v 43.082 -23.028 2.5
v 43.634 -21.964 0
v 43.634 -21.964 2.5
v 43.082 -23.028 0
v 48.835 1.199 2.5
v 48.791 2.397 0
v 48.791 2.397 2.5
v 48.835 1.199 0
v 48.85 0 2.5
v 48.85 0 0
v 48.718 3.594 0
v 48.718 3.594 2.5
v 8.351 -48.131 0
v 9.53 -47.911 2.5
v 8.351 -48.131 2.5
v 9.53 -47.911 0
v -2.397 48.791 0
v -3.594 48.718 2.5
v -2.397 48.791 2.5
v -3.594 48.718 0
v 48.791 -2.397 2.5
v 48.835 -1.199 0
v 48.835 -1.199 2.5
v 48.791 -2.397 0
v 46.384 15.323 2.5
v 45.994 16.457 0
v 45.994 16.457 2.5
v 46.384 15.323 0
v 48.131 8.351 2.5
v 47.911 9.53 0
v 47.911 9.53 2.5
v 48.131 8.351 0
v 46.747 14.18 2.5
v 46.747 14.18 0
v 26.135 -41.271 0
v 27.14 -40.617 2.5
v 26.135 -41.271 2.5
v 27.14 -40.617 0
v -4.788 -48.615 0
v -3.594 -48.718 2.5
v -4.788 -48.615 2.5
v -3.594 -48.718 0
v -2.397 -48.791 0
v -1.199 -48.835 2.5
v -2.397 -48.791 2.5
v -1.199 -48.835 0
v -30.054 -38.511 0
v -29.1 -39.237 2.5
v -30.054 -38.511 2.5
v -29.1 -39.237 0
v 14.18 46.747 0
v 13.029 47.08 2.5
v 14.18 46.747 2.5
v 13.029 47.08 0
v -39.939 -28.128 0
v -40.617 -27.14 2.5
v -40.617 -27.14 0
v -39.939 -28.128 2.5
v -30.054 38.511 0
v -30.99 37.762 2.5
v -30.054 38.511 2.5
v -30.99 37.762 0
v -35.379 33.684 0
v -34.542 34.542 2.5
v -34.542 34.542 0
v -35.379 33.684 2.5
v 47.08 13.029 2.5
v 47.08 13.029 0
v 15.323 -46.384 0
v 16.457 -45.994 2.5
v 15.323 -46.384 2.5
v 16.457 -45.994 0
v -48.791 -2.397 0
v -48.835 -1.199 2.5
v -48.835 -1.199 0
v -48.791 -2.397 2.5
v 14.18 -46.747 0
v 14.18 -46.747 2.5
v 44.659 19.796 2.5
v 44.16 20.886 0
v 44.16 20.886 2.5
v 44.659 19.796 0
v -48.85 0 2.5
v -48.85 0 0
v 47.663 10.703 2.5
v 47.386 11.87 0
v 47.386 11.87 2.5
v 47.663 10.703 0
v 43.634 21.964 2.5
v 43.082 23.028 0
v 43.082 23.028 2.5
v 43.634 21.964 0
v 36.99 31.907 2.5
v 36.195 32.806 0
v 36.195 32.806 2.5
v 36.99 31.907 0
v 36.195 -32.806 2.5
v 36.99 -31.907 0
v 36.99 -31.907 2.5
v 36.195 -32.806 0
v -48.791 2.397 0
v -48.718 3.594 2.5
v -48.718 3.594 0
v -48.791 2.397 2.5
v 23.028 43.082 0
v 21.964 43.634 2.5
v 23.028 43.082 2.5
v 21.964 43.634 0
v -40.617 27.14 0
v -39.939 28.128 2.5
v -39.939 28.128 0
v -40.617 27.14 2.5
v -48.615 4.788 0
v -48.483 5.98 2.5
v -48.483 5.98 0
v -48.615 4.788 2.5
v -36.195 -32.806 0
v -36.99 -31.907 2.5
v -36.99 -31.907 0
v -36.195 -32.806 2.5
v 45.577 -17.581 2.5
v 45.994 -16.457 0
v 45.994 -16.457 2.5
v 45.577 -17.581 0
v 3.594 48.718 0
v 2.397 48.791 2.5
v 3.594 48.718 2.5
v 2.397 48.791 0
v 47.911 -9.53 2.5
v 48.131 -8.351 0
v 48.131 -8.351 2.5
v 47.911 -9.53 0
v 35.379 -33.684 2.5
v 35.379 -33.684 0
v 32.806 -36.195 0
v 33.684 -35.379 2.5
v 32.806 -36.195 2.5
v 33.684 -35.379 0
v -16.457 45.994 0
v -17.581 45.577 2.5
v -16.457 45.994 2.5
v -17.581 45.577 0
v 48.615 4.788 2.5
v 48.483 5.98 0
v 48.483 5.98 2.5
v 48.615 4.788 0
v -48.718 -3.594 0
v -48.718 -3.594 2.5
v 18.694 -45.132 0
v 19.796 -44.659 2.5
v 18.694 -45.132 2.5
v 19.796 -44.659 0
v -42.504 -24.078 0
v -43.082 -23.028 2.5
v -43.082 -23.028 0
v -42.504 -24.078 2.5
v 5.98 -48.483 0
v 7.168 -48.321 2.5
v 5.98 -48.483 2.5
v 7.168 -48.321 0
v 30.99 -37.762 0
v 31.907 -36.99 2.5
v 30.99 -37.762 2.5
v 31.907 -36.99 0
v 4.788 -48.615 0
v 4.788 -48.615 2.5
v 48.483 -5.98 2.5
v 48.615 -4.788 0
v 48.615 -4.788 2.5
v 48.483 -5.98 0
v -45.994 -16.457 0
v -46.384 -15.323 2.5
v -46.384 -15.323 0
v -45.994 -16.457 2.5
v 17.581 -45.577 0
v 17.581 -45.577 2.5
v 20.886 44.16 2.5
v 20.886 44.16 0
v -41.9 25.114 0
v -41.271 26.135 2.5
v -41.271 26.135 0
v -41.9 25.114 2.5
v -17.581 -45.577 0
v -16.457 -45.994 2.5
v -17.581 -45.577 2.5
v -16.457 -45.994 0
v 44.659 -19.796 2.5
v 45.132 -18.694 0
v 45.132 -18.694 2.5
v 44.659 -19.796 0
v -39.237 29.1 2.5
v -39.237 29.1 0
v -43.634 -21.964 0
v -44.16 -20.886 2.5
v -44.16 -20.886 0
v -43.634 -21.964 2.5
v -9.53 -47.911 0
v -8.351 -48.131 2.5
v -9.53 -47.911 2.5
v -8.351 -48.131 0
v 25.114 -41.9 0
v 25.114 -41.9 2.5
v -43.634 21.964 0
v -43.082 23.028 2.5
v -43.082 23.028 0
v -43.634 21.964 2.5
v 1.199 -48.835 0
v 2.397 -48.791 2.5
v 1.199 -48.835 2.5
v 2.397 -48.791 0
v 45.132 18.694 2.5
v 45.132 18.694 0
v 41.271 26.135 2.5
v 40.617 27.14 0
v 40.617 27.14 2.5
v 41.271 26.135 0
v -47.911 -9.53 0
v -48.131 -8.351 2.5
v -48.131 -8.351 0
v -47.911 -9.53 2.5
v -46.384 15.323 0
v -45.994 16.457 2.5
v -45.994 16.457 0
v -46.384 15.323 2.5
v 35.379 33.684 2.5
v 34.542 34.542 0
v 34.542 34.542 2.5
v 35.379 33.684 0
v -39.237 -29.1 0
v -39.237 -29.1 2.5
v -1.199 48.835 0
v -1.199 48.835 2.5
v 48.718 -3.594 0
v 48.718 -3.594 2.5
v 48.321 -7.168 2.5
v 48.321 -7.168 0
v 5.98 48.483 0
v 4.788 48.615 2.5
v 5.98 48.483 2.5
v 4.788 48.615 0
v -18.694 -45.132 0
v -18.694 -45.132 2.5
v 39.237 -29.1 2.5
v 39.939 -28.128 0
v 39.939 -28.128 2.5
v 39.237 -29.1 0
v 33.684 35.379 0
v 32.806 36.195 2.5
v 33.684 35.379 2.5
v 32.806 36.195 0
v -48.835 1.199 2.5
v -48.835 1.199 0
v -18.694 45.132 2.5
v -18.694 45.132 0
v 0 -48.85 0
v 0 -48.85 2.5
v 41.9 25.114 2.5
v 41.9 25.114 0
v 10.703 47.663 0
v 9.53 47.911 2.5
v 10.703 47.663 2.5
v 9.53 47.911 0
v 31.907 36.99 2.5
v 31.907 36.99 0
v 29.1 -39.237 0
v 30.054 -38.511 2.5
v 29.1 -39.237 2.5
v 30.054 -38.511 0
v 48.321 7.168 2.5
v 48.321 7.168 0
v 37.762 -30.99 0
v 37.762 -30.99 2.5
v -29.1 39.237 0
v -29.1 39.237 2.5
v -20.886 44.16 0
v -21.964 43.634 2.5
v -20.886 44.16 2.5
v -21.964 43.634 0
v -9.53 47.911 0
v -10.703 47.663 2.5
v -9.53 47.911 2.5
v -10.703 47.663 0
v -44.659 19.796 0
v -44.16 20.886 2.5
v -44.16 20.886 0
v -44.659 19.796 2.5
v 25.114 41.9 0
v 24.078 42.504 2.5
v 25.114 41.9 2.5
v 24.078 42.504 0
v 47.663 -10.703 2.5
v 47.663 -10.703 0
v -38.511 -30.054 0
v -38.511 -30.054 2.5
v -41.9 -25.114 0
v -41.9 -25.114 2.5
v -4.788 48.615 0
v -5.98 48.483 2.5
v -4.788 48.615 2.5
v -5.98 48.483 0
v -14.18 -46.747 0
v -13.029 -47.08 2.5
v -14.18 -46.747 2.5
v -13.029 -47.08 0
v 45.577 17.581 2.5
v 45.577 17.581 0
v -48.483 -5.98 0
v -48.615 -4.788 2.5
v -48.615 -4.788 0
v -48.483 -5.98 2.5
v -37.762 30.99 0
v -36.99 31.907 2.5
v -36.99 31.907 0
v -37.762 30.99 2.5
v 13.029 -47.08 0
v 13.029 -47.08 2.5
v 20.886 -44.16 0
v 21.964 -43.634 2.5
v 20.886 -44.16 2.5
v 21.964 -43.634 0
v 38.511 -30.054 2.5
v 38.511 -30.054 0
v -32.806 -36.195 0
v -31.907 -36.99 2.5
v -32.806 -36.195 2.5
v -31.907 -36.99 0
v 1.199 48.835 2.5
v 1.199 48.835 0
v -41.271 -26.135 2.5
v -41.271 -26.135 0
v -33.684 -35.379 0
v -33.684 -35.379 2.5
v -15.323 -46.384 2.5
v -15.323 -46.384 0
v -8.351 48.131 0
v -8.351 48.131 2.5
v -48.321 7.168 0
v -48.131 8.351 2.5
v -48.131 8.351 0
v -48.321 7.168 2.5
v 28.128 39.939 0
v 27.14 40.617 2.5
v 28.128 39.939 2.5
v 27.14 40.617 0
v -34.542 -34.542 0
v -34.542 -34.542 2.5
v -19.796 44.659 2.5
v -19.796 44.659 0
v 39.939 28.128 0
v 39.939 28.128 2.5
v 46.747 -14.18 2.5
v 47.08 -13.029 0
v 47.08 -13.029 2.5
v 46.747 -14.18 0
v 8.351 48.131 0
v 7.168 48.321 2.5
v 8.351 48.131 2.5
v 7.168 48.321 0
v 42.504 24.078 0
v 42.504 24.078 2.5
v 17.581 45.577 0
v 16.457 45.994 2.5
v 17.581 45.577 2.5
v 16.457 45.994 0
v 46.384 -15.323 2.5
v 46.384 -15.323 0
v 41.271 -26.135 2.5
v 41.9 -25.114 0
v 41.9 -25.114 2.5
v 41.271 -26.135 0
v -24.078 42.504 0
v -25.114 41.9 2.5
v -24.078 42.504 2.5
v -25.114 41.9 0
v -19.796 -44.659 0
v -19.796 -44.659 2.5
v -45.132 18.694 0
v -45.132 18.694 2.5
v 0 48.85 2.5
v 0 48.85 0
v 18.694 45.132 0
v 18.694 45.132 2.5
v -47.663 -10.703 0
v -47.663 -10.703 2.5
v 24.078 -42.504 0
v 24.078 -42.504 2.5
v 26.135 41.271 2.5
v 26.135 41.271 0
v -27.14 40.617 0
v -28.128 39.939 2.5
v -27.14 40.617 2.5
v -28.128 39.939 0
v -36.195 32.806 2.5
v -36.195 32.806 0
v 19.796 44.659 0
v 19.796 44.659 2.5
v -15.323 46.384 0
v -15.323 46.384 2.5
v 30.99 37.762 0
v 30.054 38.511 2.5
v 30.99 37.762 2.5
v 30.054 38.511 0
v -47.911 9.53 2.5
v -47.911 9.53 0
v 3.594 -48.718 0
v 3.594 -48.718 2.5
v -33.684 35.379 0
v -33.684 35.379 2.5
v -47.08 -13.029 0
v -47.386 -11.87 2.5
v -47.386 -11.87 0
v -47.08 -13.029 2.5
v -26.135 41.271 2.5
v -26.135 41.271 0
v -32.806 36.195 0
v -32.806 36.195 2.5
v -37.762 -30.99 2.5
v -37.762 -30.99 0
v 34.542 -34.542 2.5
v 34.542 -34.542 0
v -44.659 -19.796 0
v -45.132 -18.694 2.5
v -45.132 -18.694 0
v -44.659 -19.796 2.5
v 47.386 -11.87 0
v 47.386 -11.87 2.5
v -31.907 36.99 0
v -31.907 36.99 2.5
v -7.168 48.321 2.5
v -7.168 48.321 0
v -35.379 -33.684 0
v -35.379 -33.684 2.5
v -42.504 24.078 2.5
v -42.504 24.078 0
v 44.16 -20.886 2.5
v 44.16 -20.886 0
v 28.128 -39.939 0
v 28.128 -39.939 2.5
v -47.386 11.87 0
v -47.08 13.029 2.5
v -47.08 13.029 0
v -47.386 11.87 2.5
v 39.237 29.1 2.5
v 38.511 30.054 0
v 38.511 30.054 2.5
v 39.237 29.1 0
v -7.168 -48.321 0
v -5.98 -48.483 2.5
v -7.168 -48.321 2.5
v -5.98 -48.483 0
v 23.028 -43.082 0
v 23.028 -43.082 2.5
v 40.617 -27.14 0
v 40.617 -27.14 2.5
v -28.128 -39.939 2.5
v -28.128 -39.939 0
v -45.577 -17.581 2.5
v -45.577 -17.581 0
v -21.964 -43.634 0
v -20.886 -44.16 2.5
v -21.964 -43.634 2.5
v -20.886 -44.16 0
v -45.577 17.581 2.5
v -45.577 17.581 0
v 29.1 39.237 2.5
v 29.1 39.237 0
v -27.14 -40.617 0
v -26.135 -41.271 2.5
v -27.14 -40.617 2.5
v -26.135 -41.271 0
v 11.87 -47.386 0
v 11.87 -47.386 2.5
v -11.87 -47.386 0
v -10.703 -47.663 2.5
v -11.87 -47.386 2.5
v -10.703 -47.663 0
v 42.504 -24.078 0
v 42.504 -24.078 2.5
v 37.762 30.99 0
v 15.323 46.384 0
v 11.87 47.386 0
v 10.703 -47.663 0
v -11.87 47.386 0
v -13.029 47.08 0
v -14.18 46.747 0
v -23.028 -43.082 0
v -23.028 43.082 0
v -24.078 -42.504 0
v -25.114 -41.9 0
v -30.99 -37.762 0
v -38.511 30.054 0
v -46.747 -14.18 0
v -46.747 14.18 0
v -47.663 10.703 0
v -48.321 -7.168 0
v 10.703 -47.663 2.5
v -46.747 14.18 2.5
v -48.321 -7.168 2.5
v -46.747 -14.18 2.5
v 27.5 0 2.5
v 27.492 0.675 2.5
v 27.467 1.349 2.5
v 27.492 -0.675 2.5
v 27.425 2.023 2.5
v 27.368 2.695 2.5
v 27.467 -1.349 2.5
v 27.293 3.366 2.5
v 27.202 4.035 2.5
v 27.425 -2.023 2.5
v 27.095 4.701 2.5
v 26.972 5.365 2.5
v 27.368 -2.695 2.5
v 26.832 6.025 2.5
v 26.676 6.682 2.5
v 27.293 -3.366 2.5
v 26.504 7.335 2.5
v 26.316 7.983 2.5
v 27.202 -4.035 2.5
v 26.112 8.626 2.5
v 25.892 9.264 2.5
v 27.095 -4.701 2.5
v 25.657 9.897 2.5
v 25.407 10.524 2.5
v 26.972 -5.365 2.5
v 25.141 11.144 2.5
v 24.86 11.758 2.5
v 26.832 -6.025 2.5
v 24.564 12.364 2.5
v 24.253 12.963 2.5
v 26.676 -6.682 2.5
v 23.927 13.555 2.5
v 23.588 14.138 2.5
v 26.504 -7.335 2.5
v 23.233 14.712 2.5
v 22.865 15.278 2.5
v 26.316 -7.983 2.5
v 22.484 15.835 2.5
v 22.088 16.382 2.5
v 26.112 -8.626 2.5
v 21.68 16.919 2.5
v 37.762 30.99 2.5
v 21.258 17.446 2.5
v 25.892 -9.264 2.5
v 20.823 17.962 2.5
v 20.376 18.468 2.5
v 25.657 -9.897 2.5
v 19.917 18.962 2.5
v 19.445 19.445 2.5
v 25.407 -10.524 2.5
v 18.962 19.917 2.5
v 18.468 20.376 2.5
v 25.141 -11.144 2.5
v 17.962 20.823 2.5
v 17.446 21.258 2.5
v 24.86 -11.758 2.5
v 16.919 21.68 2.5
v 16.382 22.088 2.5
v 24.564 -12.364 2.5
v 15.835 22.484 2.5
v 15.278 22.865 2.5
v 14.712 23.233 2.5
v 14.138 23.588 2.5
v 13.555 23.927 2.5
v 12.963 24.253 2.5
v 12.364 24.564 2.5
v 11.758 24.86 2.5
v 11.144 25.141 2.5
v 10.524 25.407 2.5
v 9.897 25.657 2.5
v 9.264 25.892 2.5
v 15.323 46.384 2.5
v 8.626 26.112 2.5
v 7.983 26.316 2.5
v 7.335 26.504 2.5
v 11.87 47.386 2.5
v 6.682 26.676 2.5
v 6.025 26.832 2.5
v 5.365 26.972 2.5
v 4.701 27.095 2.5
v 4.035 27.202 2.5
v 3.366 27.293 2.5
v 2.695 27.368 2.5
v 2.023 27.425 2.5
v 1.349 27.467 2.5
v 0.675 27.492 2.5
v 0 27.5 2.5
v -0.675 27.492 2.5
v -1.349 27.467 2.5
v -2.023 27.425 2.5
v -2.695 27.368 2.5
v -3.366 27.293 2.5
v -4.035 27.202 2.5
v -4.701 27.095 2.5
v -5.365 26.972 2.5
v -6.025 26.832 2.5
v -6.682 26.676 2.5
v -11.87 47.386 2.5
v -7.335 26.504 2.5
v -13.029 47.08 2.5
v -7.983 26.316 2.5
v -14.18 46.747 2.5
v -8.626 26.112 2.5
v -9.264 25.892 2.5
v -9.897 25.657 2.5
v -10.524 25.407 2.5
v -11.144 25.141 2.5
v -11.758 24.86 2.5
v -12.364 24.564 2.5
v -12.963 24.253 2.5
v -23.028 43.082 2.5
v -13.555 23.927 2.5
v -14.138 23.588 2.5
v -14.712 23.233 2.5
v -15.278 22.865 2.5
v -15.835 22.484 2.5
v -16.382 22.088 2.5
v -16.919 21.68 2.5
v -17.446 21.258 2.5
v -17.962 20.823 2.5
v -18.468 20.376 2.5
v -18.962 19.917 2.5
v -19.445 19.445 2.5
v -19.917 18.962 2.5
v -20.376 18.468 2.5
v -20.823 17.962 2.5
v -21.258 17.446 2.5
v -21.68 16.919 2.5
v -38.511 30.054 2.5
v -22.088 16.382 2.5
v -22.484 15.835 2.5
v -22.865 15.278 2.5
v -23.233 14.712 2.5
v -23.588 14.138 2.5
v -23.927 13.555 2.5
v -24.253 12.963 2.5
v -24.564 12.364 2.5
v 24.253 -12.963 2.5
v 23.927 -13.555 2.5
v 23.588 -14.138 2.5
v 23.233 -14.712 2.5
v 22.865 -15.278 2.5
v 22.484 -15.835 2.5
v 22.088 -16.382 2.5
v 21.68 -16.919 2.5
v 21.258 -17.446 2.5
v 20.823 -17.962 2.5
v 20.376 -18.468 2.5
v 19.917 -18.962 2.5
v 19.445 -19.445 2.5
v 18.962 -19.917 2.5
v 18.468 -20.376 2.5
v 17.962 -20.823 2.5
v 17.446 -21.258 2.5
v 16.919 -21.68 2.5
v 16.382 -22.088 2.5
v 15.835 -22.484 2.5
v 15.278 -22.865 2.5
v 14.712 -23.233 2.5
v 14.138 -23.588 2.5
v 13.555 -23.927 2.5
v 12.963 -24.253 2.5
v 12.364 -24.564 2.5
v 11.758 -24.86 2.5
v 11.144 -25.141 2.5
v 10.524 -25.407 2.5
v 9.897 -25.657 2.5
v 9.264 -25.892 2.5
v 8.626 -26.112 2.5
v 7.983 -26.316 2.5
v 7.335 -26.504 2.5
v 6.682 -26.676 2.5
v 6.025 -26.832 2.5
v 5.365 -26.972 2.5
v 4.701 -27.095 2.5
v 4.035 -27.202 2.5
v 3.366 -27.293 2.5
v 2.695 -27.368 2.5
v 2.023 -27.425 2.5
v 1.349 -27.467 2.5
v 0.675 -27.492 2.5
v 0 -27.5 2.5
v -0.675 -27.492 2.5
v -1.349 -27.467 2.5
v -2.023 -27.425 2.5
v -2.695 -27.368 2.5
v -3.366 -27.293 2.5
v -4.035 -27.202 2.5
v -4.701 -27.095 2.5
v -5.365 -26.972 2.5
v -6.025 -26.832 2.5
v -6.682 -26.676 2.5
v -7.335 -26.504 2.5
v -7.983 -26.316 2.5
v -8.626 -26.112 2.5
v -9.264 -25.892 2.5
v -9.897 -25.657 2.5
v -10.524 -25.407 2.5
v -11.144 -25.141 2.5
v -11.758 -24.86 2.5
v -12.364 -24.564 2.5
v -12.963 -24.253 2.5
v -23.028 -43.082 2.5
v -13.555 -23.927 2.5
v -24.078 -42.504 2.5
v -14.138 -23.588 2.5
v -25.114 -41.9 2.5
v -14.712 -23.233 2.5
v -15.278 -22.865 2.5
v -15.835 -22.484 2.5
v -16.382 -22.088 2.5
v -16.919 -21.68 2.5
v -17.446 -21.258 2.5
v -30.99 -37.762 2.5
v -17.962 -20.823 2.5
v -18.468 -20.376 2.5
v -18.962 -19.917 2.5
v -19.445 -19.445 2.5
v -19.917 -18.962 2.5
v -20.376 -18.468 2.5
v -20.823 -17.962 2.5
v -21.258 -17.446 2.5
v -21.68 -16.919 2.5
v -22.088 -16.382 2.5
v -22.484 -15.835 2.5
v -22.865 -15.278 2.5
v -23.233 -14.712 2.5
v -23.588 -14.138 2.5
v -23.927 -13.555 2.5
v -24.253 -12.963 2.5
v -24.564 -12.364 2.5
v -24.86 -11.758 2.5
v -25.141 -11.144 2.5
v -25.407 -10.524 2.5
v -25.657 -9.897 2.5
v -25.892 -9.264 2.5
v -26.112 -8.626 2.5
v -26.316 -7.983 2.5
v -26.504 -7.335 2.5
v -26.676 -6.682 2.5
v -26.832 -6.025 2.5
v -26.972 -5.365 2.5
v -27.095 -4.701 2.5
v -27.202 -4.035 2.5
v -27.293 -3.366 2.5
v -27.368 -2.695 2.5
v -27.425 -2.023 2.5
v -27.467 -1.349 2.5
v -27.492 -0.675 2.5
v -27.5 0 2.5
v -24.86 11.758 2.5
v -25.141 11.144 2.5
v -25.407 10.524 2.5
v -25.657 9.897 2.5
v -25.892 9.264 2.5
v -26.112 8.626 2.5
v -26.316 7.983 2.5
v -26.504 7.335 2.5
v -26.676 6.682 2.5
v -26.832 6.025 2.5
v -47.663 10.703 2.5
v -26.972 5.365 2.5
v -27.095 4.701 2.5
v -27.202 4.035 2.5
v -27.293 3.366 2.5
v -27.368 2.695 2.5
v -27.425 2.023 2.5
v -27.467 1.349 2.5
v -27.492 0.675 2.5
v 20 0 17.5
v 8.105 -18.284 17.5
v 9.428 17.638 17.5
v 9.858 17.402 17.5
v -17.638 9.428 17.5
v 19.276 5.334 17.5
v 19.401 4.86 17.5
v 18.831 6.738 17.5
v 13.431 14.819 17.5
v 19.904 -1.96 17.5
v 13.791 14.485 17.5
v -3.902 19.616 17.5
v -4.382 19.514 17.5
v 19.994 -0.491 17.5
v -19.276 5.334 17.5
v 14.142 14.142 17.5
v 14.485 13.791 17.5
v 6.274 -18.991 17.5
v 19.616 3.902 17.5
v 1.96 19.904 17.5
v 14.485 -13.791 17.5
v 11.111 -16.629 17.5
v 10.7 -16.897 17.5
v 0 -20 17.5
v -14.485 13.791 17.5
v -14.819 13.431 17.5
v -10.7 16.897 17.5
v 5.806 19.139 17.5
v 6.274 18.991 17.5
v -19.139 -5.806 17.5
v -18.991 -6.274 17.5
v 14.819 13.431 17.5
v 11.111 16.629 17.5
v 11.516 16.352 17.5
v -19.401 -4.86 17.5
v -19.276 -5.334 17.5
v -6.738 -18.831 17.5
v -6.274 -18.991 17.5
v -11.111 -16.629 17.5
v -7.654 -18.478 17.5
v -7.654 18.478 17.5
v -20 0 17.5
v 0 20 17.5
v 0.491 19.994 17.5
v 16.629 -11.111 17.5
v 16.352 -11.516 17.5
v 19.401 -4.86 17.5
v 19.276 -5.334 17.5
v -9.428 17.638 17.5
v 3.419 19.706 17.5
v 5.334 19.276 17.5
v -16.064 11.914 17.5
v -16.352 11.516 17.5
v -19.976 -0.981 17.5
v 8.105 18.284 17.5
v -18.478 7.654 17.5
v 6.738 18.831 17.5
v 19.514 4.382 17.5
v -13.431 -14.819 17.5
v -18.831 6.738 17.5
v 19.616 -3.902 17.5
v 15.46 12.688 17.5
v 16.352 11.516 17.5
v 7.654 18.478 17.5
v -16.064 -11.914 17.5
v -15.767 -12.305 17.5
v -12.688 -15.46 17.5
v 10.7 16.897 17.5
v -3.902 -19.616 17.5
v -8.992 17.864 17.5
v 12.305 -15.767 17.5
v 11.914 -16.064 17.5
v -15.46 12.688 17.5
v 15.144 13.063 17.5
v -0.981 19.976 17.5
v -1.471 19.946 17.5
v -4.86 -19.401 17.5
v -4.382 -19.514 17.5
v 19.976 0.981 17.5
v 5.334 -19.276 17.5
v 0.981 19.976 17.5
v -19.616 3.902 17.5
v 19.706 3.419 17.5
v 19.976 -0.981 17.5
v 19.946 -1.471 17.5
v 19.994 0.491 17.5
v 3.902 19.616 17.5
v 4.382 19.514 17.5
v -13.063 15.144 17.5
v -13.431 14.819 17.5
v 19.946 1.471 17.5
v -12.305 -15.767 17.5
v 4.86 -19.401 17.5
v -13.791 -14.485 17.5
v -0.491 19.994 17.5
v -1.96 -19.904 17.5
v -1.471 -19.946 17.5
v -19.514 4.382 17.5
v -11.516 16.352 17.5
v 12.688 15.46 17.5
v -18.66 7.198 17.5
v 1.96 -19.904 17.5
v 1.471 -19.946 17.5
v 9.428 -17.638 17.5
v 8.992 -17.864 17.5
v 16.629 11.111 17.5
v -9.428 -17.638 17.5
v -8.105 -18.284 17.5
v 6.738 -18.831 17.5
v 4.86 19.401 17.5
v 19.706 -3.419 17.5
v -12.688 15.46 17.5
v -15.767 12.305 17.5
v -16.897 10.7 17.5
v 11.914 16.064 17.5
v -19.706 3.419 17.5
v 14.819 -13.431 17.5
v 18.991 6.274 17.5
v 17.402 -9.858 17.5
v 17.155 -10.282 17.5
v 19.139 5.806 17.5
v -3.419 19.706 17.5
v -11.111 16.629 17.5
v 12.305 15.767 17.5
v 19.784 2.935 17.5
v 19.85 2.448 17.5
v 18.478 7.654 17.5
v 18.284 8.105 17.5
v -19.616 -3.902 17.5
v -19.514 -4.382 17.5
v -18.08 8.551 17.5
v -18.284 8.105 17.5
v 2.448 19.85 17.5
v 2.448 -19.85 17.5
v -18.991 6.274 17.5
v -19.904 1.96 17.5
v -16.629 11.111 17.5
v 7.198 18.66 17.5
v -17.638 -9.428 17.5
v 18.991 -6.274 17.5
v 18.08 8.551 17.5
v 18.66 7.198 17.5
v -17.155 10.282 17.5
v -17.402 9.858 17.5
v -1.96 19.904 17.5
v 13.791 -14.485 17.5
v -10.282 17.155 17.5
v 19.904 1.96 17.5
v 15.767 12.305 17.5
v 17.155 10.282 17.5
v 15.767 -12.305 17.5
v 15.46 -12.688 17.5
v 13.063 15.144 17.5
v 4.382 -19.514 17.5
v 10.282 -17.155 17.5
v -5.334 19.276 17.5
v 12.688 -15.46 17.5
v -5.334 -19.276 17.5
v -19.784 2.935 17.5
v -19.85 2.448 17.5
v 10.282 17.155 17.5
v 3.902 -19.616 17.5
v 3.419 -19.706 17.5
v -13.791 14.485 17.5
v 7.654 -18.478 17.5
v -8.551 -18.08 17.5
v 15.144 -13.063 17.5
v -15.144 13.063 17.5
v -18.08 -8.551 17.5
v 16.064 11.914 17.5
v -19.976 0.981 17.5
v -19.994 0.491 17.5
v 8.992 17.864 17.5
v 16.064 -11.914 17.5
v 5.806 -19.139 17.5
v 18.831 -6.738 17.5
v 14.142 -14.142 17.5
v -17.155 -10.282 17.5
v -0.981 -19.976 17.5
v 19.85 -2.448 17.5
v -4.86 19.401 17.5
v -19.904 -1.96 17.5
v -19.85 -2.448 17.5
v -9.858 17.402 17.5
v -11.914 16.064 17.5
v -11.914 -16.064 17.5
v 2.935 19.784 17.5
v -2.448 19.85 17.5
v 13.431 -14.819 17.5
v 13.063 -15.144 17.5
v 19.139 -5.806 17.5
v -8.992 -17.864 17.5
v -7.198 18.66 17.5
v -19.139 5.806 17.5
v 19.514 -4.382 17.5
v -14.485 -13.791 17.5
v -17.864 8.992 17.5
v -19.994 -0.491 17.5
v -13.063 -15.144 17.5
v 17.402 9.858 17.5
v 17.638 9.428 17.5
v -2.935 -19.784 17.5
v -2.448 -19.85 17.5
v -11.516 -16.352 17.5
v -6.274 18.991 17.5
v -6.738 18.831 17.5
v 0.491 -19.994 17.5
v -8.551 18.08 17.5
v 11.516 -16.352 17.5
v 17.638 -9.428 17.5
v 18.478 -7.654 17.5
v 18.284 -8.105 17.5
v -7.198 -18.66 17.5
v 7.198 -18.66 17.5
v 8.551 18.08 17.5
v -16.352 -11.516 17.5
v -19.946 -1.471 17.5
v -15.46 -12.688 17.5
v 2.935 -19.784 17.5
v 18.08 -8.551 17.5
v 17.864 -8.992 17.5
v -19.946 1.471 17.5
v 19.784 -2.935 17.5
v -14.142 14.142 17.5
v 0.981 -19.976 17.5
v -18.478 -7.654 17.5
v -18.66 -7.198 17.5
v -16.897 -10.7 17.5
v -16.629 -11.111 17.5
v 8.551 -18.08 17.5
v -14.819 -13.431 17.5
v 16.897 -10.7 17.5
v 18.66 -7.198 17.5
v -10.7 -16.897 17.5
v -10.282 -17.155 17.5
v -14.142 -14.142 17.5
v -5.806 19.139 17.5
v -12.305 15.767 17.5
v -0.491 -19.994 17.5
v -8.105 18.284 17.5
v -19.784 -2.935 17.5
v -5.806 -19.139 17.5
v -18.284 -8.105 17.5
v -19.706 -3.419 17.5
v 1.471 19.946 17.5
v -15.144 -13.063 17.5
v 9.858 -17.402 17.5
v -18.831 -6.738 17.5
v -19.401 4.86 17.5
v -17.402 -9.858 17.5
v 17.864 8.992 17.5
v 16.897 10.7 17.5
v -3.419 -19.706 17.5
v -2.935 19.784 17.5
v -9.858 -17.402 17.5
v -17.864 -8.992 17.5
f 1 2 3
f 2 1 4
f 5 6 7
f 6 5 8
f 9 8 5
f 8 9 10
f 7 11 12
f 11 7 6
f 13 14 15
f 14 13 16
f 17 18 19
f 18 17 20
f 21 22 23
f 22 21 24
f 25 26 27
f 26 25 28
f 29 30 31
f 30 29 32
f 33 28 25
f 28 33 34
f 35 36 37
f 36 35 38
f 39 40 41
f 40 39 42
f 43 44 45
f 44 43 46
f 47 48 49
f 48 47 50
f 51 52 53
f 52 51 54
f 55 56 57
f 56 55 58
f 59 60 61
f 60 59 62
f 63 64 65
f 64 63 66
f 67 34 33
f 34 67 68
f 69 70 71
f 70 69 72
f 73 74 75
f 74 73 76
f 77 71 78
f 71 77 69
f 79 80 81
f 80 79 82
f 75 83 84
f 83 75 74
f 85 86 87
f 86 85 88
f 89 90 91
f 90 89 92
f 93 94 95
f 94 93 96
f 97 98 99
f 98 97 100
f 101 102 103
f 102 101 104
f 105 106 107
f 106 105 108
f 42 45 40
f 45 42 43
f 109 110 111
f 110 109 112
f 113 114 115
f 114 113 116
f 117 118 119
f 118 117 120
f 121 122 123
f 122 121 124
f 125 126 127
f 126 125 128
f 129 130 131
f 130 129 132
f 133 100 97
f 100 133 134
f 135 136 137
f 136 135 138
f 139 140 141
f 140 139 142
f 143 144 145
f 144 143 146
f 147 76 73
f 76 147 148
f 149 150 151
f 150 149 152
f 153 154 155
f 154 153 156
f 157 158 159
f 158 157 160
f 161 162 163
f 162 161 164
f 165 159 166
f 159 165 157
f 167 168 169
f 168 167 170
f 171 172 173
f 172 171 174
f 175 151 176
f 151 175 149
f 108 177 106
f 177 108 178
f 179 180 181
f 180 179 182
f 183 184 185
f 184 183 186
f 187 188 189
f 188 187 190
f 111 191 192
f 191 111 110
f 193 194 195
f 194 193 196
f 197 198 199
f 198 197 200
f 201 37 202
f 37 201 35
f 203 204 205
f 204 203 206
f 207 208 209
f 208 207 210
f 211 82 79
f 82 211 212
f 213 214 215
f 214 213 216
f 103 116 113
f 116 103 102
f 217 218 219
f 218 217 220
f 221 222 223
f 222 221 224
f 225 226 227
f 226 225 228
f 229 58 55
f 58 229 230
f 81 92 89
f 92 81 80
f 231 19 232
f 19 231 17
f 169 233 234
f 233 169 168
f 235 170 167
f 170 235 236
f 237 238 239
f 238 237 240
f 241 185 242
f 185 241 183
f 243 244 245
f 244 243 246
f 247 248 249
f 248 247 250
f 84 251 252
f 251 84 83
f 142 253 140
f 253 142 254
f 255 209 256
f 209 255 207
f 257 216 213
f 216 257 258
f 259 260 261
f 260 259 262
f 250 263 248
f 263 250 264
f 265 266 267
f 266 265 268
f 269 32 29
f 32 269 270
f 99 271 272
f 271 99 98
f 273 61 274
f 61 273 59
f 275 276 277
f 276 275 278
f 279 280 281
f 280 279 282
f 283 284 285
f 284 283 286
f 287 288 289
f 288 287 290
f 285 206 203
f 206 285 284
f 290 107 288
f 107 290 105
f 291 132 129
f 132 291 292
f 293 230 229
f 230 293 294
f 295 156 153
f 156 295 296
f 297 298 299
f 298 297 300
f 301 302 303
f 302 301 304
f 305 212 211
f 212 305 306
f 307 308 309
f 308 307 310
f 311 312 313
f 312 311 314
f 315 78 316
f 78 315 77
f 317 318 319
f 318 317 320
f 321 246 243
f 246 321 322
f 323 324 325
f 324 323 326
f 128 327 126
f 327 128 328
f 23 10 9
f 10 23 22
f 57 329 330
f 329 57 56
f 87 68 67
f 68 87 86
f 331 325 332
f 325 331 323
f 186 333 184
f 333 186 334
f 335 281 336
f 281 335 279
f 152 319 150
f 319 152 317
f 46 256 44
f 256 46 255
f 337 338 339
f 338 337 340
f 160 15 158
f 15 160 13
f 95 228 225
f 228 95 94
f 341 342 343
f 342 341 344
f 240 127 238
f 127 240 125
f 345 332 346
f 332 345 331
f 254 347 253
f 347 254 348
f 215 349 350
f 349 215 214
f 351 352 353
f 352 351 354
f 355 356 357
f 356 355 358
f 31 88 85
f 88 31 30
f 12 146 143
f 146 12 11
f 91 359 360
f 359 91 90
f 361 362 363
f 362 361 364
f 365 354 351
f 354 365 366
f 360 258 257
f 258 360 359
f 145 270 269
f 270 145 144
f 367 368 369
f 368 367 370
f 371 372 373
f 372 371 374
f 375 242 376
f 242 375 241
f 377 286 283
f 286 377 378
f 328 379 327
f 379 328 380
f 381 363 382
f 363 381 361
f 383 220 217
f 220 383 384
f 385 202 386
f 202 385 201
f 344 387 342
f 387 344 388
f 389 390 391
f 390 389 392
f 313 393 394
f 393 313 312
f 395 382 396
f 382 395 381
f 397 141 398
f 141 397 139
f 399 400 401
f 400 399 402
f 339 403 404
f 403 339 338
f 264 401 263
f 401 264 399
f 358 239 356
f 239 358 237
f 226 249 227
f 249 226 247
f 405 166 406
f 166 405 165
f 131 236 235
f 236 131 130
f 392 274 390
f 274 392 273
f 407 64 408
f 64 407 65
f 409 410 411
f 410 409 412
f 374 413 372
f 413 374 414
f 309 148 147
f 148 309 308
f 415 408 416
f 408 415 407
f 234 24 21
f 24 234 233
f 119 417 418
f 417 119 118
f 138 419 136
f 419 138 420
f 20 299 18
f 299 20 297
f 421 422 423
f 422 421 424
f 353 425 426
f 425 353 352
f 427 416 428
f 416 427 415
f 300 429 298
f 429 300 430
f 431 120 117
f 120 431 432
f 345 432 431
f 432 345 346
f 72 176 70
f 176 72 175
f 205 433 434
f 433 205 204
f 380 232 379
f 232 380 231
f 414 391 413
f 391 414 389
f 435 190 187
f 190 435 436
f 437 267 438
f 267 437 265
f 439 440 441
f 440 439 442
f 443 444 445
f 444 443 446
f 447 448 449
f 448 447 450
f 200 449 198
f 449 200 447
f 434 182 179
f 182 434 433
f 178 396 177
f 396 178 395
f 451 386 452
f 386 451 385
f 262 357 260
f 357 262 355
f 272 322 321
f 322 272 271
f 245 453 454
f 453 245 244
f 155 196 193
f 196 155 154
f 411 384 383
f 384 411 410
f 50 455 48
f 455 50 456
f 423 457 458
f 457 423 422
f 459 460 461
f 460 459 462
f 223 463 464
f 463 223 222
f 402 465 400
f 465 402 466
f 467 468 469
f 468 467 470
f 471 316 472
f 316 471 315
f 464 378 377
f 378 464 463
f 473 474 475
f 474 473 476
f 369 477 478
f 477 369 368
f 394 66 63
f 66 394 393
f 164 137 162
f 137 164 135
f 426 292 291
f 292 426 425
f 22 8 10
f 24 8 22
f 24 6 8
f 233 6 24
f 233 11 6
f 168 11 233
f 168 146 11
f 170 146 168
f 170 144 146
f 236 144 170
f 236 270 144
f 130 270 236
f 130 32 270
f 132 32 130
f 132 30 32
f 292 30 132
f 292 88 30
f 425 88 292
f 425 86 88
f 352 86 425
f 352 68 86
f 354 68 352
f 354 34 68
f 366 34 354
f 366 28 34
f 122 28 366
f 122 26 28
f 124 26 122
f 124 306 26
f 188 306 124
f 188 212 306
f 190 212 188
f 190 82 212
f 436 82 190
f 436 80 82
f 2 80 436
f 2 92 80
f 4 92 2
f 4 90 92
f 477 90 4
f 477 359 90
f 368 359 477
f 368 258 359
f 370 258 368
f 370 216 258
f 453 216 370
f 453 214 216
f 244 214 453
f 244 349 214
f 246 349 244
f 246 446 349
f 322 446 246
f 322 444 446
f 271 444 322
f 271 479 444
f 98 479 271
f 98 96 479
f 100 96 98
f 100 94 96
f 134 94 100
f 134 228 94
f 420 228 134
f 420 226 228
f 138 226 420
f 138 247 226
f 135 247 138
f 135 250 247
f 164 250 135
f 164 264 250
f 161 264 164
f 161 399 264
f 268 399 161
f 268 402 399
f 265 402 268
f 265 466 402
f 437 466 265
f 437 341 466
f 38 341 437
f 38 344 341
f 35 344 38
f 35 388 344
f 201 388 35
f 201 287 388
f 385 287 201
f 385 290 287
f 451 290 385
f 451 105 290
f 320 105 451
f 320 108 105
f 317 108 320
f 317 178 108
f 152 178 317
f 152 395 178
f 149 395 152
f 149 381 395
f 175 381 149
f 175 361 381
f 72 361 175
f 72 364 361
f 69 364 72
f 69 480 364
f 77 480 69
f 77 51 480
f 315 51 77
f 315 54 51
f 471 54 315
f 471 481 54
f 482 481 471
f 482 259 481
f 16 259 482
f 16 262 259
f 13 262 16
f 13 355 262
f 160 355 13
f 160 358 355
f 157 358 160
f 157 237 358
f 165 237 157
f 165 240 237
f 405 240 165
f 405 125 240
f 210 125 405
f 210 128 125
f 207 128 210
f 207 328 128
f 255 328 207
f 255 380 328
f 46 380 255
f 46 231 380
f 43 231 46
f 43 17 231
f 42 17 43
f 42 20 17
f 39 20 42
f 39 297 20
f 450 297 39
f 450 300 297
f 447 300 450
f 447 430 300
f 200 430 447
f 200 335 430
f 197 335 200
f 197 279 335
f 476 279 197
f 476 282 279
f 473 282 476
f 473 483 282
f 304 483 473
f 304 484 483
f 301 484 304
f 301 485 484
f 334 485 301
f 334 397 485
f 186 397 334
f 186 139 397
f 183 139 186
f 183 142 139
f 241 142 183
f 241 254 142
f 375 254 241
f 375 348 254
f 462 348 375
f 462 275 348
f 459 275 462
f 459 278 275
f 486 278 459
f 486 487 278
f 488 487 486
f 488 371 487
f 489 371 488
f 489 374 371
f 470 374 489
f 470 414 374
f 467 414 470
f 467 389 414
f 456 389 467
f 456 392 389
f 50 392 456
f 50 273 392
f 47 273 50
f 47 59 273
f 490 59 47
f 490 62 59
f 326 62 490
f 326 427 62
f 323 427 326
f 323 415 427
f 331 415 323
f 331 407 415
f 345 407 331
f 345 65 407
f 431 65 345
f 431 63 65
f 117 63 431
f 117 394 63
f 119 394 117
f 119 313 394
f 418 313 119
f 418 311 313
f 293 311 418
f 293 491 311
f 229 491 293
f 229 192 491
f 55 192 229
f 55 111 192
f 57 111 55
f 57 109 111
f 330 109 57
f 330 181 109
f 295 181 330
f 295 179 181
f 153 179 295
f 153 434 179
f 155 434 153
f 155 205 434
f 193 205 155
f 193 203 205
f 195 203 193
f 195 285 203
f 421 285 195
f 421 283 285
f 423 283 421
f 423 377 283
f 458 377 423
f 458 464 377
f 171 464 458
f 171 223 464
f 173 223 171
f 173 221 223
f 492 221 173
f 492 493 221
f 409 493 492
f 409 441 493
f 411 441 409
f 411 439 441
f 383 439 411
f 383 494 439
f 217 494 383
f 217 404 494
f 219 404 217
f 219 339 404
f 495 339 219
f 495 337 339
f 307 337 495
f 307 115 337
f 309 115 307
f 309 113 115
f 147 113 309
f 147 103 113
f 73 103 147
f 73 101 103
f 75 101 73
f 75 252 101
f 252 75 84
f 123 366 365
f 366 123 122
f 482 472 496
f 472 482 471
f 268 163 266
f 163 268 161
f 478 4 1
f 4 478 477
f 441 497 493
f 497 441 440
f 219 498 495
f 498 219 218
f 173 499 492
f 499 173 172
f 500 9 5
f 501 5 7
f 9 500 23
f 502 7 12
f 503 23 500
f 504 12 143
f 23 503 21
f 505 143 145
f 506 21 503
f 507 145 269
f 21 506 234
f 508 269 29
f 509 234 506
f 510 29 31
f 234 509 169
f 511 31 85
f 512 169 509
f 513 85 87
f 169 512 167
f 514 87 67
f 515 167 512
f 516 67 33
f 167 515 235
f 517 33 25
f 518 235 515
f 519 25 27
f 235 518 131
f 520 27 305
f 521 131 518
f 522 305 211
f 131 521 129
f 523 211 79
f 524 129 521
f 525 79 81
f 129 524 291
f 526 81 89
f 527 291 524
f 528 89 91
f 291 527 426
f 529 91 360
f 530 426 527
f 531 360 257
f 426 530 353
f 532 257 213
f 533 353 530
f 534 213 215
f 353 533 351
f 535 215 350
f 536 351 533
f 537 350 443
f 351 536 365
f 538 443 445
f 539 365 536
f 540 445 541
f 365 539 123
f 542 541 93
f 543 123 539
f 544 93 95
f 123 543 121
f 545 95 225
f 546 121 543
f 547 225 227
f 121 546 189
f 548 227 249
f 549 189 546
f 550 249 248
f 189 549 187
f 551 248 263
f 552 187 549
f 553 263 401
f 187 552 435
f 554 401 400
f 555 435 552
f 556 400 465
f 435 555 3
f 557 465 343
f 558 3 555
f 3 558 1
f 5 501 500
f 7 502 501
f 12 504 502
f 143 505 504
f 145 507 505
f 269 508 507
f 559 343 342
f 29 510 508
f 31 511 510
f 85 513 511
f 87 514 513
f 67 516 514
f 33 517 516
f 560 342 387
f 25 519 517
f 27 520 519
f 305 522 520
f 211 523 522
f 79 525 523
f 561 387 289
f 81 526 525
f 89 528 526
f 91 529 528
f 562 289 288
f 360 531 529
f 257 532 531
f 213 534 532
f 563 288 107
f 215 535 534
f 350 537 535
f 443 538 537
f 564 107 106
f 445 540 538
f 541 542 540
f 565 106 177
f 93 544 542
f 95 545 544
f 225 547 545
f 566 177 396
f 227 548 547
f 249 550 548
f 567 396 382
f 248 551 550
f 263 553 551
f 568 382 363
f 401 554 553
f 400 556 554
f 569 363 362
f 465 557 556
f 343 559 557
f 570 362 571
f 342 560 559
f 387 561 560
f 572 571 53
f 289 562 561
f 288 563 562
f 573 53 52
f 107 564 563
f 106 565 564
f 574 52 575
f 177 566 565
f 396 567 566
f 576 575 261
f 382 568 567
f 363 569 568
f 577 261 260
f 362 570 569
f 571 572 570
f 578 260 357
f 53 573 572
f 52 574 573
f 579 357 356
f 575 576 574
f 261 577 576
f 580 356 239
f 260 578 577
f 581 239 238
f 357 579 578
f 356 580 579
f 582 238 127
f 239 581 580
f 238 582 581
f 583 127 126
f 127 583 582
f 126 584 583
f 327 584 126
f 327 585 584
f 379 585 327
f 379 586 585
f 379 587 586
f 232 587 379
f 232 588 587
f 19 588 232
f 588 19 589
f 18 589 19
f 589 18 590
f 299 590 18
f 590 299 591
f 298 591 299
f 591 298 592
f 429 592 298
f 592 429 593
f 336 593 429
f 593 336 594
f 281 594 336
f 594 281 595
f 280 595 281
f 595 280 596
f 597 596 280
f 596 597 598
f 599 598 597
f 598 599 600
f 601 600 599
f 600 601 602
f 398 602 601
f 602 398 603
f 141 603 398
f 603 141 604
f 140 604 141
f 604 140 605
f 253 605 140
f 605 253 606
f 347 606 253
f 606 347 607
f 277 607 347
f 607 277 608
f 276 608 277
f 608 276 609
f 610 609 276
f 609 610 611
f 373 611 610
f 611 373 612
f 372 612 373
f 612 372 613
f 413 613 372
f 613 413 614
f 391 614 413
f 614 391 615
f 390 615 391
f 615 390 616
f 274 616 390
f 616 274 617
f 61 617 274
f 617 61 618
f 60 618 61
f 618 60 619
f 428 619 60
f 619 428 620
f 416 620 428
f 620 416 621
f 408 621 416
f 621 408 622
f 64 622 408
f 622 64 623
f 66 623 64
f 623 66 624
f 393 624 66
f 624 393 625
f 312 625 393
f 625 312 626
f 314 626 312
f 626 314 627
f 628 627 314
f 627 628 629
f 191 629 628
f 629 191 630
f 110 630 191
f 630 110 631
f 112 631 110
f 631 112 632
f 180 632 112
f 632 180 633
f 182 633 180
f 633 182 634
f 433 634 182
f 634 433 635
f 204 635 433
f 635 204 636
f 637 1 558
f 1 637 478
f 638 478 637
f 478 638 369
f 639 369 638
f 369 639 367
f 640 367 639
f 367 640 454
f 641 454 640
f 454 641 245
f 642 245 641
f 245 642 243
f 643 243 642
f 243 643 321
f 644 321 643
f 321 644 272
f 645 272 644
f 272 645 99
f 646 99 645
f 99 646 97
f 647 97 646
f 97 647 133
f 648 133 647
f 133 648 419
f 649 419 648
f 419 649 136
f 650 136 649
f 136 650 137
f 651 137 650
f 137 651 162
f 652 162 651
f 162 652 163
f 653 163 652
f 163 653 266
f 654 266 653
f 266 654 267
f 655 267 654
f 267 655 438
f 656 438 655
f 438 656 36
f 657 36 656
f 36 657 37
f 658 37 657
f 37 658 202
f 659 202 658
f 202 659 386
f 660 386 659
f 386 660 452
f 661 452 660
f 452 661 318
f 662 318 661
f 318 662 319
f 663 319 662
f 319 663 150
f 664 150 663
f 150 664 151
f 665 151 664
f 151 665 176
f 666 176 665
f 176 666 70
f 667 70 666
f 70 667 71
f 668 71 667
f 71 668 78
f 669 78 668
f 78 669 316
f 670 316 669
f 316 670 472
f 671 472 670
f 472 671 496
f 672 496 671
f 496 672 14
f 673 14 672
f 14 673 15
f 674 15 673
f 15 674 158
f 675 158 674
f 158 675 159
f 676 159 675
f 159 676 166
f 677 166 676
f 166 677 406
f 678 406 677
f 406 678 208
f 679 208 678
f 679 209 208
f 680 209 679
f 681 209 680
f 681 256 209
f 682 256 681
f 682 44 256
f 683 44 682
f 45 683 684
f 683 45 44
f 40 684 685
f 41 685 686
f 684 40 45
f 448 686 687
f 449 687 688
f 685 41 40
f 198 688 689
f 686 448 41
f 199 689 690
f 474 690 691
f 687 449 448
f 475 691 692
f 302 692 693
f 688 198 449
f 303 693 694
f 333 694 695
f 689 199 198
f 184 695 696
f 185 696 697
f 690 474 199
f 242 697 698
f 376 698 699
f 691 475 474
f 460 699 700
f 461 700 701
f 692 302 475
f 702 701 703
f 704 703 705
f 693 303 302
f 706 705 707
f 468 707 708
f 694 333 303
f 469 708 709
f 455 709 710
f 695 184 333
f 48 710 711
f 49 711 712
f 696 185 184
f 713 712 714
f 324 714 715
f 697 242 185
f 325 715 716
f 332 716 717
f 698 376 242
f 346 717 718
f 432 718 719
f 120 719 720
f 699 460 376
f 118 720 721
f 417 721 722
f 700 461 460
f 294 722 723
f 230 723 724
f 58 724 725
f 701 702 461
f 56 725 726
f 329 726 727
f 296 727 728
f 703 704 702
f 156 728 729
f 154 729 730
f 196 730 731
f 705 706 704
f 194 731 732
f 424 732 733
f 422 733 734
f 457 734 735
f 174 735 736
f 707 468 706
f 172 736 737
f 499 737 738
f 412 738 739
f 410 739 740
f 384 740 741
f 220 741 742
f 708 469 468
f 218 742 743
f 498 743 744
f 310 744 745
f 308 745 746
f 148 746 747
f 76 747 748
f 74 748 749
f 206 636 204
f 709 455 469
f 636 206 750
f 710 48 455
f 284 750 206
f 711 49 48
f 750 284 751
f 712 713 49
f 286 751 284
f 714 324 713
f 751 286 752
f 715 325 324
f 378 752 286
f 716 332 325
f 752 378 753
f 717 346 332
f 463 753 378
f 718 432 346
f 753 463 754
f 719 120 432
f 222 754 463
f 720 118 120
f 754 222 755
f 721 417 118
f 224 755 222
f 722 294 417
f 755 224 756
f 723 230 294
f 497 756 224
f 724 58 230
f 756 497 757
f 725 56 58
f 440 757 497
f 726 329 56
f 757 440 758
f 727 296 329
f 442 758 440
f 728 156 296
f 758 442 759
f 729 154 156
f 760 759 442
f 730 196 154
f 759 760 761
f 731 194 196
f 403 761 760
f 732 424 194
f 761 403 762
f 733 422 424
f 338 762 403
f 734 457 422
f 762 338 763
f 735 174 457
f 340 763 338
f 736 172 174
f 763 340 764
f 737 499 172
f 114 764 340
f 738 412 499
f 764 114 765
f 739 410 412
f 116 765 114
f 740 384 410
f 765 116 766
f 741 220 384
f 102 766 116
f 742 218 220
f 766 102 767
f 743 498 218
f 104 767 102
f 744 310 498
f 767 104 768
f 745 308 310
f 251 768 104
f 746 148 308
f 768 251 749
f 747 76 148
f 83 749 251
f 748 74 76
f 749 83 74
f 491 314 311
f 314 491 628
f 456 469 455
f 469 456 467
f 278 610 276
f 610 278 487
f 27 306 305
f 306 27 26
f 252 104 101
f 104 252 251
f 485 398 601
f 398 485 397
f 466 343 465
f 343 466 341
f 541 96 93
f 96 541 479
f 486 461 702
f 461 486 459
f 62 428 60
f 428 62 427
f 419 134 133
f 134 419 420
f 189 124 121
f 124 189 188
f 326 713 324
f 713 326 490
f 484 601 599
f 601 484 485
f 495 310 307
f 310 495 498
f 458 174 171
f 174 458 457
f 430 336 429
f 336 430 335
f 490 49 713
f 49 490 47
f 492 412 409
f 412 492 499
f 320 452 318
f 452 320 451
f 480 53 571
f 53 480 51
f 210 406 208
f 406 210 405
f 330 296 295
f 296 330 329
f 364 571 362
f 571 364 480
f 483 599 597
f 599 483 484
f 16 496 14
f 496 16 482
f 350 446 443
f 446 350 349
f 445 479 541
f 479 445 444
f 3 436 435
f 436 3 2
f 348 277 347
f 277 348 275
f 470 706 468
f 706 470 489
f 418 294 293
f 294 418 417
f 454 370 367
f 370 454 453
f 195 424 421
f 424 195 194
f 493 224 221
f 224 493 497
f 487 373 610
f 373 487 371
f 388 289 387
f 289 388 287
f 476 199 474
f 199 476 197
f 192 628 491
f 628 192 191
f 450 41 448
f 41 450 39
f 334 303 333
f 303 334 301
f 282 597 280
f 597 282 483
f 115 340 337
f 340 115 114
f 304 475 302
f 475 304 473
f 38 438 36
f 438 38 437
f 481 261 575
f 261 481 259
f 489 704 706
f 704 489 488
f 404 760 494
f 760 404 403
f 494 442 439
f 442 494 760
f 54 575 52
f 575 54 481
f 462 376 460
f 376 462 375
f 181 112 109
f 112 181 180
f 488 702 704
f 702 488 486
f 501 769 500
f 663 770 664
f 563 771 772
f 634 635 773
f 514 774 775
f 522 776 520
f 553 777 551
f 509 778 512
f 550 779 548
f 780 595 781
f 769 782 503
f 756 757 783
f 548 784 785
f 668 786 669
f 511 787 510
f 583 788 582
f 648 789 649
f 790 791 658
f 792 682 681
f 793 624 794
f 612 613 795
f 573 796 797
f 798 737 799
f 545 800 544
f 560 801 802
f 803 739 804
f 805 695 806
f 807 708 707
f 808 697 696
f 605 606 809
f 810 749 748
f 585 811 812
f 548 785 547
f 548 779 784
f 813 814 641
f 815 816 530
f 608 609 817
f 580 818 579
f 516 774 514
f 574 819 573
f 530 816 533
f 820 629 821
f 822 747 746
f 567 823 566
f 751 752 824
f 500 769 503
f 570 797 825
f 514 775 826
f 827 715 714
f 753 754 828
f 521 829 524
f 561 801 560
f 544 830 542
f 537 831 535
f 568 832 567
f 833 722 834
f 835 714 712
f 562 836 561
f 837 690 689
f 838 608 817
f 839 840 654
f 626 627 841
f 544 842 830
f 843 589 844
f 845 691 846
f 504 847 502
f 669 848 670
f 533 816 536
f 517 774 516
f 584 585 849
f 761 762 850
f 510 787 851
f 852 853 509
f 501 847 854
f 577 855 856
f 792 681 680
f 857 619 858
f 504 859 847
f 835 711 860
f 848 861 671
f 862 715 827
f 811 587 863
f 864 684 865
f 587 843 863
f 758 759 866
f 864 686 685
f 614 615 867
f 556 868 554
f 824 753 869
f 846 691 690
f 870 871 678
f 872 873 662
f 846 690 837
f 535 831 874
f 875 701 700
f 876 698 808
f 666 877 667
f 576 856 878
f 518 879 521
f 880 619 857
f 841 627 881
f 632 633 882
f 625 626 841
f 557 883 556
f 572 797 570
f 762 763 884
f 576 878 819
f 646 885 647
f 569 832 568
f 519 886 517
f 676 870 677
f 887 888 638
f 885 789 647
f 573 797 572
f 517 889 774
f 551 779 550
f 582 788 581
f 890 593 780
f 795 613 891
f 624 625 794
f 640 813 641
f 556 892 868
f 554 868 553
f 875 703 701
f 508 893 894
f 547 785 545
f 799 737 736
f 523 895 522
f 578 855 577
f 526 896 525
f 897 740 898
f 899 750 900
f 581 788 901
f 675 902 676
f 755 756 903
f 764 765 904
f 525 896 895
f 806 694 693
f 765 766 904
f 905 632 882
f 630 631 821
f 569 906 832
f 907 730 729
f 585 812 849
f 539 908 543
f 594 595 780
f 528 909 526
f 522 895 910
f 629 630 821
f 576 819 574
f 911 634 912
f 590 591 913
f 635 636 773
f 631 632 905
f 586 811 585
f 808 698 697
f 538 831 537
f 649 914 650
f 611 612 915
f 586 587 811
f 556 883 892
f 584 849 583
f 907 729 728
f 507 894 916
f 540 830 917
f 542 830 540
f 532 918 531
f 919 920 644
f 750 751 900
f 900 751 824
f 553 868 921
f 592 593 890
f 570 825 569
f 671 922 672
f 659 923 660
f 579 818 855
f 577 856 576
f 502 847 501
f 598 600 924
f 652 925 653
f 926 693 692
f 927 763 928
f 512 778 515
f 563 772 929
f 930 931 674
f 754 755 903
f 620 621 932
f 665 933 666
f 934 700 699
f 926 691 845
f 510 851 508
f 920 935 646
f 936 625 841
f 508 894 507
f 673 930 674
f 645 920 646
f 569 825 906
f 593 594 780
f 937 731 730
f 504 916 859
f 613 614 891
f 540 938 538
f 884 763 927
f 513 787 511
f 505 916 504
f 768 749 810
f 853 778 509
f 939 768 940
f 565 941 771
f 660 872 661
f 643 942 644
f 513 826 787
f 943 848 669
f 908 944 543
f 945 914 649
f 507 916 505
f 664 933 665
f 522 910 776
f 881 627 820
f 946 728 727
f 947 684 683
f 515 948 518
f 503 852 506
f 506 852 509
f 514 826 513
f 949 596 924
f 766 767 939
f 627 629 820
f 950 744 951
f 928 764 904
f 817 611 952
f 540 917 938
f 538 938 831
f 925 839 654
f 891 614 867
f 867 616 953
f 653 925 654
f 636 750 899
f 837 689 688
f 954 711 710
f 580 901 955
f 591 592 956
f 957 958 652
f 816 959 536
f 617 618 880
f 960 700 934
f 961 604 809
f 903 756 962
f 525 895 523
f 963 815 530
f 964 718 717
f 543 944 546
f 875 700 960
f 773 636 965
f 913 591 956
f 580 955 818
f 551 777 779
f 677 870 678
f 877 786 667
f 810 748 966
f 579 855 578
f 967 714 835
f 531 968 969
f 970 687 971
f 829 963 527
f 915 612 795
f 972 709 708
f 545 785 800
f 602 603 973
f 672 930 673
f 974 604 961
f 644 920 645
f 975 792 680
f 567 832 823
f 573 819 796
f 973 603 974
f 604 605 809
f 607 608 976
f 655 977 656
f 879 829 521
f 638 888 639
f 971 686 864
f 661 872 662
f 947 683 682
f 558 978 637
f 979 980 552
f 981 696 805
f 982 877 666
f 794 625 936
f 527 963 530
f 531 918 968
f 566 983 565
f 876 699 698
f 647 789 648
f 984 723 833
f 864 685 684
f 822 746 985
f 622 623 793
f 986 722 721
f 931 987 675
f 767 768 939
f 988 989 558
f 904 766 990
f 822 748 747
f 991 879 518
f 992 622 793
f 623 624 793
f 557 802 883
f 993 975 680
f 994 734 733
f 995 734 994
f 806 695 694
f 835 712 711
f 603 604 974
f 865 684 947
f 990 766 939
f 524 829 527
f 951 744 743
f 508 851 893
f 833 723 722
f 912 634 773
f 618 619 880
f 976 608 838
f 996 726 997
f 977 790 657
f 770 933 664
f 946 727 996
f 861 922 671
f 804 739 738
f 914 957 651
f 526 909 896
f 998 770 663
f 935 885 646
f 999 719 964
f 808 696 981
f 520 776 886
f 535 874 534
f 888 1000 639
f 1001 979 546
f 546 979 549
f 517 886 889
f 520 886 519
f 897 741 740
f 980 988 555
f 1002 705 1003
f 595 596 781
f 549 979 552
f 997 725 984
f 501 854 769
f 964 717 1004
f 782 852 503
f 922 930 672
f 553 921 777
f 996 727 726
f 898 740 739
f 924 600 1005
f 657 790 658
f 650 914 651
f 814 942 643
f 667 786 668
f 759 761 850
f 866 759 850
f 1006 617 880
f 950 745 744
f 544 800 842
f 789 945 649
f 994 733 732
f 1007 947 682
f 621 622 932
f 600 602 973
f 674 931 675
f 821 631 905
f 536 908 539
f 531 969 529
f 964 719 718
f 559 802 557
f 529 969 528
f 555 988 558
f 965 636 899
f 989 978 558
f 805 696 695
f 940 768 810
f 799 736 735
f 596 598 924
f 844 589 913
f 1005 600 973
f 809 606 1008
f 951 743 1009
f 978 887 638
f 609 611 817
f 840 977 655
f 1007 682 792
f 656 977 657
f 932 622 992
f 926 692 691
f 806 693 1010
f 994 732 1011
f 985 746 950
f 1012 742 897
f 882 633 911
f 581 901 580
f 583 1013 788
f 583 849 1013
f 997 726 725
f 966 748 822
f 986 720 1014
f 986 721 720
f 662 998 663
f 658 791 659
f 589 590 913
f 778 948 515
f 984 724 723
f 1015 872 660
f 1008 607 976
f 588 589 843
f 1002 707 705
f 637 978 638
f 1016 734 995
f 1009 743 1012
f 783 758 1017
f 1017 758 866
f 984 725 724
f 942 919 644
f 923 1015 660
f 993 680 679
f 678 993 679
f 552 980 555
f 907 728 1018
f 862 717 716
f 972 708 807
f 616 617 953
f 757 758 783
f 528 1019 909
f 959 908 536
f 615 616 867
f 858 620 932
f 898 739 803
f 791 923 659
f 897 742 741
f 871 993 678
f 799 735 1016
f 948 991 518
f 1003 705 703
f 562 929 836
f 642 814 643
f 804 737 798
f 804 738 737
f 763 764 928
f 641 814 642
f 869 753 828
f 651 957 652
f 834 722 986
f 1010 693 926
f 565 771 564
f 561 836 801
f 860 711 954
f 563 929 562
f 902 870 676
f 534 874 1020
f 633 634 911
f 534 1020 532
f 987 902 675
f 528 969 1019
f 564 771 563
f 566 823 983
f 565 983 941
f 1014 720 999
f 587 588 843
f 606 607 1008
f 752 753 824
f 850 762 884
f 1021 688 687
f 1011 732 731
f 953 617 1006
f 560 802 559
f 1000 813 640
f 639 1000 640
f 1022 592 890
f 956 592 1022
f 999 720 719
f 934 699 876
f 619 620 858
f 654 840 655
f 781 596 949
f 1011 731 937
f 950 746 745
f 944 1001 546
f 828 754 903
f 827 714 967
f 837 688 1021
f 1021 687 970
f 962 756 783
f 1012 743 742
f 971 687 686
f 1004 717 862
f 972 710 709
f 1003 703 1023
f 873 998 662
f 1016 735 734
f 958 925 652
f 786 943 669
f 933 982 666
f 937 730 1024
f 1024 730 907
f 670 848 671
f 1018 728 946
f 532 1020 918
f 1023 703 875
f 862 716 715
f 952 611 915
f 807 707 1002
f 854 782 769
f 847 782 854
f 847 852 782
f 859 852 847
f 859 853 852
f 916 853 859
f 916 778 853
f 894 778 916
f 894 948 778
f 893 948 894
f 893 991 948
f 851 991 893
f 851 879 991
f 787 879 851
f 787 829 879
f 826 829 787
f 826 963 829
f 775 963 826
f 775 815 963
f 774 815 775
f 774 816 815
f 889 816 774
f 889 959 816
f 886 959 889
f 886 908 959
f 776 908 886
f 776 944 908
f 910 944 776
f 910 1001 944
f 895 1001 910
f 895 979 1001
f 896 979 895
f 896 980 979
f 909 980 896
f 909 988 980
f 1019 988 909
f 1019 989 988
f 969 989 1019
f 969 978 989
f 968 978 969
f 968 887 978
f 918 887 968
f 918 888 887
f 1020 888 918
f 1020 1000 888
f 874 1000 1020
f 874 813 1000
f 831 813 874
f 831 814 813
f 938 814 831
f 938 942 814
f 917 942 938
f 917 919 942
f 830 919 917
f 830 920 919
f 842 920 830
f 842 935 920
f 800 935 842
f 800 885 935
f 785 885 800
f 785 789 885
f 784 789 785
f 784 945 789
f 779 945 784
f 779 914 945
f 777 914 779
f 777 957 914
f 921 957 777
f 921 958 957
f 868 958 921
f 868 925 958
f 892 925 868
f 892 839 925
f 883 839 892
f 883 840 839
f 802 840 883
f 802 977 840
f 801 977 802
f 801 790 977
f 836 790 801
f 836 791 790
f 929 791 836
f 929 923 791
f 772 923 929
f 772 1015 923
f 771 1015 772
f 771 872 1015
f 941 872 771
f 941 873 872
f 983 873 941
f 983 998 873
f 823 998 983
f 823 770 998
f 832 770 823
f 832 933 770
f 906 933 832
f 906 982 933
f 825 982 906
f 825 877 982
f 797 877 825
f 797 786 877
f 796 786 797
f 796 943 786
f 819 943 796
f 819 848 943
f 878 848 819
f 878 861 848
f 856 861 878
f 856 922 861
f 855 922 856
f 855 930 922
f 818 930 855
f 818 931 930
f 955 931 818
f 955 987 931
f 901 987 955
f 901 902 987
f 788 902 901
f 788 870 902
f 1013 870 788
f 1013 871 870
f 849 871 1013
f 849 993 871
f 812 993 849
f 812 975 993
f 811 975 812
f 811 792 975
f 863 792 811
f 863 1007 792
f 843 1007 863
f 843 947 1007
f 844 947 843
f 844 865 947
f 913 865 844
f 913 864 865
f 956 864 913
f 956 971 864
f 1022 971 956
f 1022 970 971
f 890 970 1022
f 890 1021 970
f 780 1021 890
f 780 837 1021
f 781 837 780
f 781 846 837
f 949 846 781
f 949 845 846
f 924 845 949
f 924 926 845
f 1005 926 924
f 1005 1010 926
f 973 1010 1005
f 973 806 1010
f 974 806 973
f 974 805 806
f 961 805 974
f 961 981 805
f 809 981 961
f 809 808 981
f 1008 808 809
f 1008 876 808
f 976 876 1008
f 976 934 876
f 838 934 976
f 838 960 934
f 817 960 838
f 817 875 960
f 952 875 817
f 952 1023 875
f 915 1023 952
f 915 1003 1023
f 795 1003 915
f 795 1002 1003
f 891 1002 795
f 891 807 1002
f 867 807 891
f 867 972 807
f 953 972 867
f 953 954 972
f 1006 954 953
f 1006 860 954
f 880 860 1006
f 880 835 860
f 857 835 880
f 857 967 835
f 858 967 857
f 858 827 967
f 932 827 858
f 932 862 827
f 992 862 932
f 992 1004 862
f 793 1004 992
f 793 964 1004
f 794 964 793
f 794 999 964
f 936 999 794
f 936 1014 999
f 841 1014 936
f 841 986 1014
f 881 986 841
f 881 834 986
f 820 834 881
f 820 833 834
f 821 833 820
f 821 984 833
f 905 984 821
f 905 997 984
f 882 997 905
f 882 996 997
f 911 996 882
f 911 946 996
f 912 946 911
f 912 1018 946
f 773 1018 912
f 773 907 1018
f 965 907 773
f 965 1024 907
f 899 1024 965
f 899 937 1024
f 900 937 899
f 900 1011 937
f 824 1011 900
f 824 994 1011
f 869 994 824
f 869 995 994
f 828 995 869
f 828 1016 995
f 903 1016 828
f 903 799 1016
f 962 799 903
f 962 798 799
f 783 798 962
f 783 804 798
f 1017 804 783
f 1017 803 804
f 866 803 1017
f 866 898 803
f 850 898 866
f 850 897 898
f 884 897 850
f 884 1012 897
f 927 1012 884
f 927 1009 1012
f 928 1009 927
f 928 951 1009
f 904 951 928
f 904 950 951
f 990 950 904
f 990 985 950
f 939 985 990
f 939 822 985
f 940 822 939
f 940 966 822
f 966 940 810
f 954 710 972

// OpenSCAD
module render()
{
  fn = 256;
  expansion_fudge = 0.5;
  base_depth = 2.5;
  hull_height = 15;
  base_radius = ((98.2) - expansion_fudge) / 2.0;
  bottom_radius = 55 / 2.0;
  top_radius = 40 / 2.0; 
  
  
  cylinder(h=base_depth, r1=base_radius,
           r2=base_radius, center=false, $fn=fn);
  translate([0, 0, base_depth])
  cylinder(h=hull_height, r1=bottom_radius,
           r2=top_radius, center=false, $fn=fn);
  
 
}

echo(version=version());

render();
